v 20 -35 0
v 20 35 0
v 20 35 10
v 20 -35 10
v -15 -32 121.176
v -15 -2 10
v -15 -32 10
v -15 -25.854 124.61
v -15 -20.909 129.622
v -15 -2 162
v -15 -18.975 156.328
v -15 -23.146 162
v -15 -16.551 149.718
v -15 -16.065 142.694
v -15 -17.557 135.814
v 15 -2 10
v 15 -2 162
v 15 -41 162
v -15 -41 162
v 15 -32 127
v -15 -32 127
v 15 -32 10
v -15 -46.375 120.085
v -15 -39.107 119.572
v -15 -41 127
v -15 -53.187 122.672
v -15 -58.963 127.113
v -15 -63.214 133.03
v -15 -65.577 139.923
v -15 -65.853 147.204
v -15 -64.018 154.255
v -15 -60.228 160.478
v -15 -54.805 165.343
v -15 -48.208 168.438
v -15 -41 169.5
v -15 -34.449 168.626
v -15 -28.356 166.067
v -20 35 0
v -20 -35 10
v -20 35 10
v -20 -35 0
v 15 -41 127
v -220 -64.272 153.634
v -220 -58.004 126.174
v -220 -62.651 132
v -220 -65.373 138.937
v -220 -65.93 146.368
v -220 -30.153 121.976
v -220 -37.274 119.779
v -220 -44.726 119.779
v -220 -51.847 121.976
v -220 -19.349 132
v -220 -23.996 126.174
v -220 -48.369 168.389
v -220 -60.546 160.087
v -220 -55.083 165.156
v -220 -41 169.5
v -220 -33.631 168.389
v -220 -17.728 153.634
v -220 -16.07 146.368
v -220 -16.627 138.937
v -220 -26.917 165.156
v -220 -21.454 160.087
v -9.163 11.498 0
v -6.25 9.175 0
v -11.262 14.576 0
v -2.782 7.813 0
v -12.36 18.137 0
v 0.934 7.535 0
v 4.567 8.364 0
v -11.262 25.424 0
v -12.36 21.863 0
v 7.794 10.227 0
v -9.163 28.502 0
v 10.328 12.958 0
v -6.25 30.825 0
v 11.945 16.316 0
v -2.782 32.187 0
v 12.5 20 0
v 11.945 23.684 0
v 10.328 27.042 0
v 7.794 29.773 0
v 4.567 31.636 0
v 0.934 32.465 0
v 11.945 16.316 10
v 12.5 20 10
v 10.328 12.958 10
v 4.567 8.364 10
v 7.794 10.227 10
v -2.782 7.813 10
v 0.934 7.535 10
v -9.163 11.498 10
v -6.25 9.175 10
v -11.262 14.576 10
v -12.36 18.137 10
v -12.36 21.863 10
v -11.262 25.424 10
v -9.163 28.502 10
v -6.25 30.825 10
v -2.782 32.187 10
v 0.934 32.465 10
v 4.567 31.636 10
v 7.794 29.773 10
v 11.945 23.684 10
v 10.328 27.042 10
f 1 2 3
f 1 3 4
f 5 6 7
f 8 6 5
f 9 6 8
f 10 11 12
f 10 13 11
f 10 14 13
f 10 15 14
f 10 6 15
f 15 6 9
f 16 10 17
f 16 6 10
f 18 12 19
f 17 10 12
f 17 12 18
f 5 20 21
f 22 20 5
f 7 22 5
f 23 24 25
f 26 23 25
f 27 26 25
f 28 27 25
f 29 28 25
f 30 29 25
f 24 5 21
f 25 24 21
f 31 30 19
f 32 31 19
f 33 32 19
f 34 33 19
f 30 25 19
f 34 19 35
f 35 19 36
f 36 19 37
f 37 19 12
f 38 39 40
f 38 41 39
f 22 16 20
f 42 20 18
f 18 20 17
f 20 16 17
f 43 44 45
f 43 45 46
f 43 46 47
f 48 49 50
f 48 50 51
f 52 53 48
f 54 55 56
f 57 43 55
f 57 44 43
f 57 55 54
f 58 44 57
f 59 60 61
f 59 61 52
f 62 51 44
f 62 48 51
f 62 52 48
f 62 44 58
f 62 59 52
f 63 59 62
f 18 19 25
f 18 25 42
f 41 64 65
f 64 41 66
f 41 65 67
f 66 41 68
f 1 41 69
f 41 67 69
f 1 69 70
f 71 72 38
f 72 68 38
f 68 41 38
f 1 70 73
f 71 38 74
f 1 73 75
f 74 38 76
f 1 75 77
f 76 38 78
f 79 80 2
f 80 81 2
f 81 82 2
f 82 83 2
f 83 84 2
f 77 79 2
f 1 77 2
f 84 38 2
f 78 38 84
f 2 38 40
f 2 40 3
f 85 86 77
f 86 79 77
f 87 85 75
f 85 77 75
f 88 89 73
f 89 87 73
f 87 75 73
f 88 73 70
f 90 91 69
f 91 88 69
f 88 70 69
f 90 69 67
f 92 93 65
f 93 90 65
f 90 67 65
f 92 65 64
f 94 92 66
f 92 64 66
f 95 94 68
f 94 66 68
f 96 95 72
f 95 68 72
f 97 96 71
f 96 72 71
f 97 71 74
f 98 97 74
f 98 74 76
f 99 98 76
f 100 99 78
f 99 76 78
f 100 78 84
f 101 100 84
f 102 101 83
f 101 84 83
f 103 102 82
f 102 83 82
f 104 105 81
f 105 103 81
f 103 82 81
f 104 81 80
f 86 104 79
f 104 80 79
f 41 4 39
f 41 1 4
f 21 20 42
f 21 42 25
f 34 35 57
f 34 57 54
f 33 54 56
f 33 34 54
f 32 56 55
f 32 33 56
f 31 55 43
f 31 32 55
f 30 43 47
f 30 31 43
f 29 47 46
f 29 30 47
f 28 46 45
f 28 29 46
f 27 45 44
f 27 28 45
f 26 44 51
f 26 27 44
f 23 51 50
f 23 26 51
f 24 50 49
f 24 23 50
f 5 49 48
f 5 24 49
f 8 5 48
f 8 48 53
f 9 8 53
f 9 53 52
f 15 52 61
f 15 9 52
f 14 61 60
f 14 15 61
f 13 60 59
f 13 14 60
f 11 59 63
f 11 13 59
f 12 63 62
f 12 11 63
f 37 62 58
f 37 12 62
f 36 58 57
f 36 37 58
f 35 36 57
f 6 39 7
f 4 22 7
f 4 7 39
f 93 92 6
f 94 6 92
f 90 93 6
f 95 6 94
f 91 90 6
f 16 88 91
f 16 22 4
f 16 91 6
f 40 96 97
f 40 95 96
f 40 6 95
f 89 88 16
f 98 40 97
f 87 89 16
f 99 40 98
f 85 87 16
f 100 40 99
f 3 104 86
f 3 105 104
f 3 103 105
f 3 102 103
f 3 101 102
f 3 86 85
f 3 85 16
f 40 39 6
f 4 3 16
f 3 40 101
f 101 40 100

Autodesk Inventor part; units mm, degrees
ref_plane "YZ Plane" through (0, 0, 0) normal (1, 0, 0) x (0, 1, 0)
ref_plane "XZ Plane" through (0, 0, 0) normal (0, 1, 0) x (-1, 0, 0)
ref_plane "XY Plane" through (0, 0, 0) normal (0, 0, 1) x (1, 0, 0)
sketch "Boceto1" plane through (0, 0, 0) normal (0, 0, 1) x (1, 0, 0)
  line L0 (-20, 35) -> (20, 35)
  line L1 (20, 35) -> (20, -35)
  line L2 (20, -35) -> (-20, -35)
  line L3 (-20, -35) -> (-20, 35)
  circle A0 centre (0, 20) radius 12.5
  line L4 (-15, -2) -> (15, -2)
  line L5 (15, -2) -> (15, -32)
  line L6 (15, -32) -> (-15, -32)
  line L7 (-15, -32) -> (-15, -2)
  point P0 (0, 0)
  point P1 (0, 35)
  point P2 (-20, 0)
  point P3 (0, -2)
  point P4 (15, -17)
  point P5 (-15, -17)
  dimension "d0" = 70
  dimension "d1" = 25
  dimension "d2" = 20
  dimension "d3" = 40
  dimension "d8" = 30
  dimension "d9" = 30
  dimension "d10" = 3
extrude "Extrusión2" add sketch "Boceto1" along normal blind 10
extrude "Extrusión3" add sketch "Boceto1" along normal blind 162 contours L4 L5 L6 L7
sketch "Boceto2" plane through (-15, -32, 10) normal (0, -1, 0) x (1, 0, 0)
  line L0 (30, 0) -> (0, 0) construction
  line L1 (30, 0) -> (30, 152) construction
  line L2 (0, 152) -> (30, 152) construction
  line L3 (0, 0) -> (0, 152) construction
  line L4 (0, 0) -> (0, 152) projected
  line L5 (30, 0) -> (30, 152) projected
  line L6 (0, 152) -> (30, 152)
  line L7 (30, 152) -> (30, 117)
  line L8 (30, 117) -> (0, 117)
  line L9 (0, 117) -> (0, 152)
  point P0 (15, -10)
  point P1 (0, 117)
  dimension "d15" = 35
extrude "Extrusión4" add sketch "Boceto2" along normal blind 9
sketch "Boceto3" plane through (-15, -32, 10) normal (-1, 0, 0) x (0, 0, 1)
  line L0 (117, -9) -> (152, -9) projected
  circle A0 centre (134.5, -9) radius 25
  point P0 (-10, 32)
  dimension "d18" = 50
extrude "Extrusión5" add sketch "Boceto3" along normal blind 205
properties part number "brazo"
